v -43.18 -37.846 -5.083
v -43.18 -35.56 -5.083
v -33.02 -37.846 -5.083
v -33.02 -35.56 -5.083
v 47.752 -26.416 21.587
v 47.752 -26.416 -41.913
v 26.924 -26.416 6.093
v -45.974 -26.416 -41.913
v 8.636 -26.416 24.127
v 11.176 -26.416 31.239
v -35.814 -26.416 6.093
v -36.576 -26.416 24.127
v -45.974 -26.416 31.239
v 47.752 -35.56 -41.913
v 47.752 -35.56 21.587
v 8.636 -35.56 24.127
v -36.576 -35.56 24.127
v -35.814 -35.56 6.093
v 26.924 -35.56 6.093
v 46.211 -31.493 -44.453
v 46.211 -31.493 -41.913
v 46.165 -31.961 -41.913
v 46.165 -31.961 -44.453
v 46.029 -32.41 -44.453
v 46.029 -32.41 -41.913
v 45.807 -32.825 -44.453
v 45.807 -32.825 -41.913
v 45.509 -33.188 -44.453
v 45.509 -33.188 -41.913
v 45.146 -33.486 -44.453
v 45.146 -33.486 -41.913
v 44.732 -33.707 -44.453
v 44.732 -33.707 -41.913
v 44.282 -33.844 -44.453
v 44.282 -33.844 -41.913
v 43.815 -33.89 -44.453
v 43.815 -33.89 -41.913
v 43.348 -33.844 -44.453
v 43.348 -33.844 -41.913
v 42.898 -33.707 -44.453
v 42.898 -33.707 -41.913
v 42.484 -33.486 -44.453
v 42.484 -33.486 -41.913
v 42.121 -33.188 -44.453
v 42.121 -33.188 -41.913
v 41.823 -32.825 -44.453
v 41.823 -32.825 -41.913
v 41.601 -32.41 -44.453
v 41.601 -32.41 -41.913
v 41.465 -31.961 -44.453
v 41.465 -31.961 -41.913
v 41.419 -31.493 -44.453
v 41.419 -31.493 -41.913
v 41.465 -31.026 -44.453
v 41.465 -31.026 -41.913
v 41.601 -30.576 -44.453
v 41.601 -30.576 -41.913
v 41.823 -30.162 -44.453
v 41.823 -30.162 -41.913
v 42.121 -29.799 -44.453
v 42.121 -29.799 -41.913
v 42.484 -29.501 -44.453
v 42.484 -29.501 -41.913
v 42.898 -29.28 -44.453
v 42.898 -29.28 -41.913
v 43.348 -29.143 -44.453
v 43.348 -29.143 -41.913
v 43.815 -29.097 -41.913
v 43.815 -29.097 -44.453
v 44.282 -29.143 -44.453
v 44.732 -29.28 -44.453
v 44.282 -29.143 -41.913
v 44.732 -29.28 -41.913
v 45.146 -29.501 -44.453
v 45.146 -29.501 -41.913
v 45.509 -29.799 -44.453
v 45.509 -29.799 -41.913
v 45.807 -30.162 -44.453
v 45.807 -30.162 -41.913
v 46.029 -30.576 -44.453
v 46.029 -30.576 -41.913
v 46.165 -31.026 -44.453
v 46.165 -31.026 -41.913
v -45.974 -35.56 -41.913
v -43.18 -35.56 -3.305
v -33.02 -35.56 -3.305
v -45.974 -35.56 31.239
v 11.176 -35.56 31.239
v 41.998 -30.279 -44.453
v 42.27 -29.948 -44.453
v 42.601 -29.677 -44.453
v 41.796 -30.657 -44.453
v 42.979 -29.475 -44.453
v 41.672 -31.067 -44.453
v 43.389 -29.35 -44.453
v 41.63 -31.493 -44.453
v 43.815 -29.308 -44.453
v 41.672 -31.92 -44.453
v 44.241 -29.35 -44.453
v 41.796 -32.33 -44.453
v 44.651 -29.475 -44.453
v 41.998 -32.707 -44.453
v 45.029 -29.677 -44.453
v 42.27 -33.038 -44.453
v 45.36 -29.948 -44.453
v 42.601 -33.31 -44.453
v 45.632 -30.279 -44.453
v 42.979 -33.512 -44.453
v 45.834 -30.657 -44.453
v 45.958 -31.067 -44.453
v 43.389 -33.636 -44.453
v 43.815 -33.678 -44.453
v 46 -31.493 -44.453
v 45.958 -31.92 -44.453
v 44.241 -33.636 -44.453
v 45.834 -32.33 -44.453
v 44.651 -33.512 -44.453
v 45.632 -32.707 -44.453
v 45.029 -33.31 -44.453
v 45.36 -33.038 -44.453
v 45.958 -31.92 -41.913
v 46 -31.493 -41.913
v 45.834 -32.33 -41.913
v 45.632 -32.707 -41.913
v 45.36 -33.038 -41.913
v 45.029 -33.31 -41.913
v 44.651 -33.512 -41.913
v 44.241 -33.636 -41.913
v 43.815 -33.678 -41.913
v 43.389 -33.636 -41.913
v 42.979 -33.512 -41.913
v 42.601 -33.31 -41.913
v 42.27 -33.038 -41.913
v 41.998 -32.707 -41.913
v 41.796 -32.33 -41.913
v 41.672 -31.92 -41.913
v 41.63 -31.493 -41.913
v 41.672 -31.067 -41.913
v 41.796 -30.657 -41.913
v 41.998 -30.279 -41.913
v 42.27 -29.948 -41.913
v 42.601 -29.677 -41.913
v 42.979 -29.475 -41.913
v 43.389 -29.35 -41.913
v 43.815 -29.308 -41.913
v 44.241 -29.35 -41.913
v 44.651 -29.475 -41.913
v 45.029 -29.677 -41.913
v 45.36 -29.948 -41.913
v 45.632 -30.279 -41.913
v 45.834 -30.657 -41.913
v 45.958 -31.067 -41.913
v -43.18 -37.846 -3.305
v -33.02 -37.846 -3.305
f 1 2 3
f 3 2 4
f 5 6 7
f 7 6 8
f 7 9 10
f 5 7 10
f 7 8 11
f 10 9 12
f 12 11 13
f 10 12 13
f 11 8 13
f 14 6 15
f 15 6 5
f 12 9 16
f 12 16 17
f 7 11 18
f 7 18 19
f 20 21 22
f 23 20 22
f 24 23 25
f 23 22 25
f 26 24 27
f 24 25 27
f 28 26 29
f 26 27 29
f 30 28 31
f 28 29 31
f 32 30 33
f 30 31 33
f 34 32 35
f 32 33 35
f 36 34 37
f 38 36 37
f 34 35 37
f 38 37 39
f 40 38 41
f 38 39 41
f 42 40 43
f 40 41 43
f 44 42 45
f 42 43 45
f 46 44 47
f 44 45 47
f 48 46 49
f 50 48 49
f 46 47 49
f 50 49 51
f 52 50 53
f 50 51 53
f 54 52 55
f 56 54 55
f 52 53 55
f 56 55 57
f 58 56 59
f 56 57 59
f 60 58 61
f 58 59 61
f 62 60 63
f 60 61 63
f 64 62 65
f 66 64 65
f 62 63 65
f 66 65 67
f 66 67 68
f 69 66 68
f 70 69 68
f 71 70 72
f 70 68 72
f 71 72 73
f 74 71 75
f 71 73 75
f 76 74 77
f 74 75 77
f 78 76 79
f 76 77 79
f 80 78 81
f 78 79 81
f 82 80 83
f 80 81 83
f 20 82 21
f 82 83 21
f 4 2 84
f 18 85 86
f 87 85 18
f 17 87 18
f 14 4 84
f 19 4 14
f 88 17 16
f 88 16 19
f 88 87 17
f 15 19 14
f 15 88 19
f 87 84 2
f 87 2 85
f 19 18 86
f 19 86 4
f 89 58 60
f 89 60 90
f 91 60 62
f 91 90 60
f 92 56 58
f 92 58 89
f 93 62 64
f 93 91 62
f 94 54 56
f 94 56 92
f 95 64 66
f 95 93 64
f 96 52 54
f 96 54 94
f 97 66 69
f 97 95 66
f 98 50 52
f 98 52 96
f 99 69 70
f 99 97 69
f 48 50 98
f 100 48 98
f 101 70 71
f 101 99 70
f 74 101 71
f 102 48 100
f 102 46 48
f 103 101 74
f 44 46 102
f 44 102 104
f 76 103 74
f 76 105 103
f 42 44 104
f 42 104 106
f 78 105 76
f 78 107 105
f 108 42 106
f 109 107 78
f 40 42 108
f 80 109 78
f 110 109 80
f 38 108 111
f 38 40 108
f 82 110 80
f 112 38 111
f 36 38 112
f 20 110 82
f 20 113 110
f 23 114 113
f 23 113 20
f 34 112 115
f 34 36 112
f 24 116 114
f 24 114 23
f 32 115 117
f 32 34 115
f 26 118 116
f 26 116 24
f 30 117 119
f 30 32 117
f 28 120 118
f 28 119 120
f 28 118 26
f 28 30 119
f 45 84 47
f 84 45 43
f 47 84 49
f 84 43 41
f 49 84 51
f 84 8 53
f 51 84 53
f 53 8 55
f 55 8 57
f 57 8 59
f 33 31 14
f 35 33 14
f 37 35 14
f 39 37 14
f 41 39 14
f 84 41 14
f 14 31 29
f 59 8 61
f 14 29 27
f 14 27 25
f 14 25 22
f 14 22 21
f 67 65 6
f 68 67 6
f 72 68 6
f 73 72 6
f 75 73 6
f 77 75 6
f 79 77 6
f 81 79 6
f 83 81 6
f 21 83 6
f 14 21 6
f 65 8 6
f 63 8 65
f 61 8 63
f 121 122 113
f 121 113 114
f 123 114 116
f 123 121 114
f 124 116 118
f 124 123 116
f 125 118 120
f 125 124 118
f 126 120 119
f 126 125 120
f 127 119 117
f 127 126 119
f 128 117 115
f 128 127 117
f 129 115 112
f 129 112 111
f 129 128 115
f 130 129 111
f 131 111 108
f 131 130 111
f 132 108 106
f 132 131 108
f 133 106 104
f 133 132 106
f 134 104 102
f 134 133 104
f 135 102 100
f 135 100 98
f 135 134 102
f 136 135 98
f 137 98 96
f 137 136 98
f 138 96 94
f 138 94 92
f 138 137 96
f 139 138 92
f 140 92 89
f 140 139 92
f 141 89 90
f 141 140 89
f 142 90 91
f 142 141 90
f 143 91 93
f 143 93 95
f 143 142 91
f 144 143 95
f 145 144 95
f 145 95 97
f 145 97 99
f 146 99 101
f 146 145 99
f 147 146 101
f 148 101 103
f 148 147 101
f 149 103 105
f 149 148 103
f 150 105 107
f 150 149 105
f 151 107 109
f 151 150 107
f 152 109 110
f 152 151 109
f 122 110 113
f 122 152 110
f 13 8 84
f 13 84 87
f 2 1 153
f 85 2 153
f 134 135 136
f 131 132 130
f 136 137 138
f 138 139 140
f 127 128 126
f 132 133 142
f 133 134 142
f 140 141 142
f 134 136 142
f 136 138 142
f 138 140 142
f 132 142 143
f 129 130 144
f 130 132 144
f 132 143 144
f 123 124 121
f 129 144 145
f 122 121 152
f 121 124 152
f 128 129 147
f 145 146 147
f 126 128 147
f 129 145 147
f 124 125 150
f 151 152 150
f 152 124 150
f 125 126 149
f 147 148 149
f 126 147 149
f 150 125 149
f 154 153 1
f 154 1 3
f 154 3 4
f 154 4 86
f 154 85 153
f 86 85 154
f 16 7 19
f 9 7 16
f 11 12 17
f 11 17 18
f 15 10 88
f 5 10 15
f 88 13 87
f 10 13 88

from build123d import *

# Parameters (mm, degrees)
F0_W      = 93.7260054052
F0_H      = 73.1520000845
F1_DEPTH  = 10.16
F3_DEPTH  = 10.16
F5_DEPTH  = 10.16
F6_DEPTH  = 25.4
F7_W      = 10.1599991322
F7_H      = 1.7780002672
F8_DEPTH  = 2.286
F9_W      = 26.4160018414
F9_H      = 73.1520000845
F10_DEPTH = 127
F12_R     = 2.3962316347
F12_R_2   = 2.1849898249
F13_DEPTH = 2.54


with BuildPart() as f1:
    # F0 (on Front) → F1 (new body)
    with BuildSketch(Plane.XZ):
        with Locations((0.8890014142, -5.3366450593)):
            Rectangle(F0_W, F0_H)
    extrude(amount=F1_DEPTH)

    # F2 (on face) → F3 (cut)
    with BuildSketch(Plane.XZ.offset(10.16)):
        Polygon((47.7520041168, 31.239354983), (11.1760003492, 31.239354983), (47.7520041168, 21.5873550624), align=None)
    extrude(amount=-F3_DEPTH, mode=Mode.SUBTRACT)

    # F4 (on face) → F5 (cut)
    with BuildSketch(Plane.XZ.offset(10.16)):
        Polygon((8.6359996349, 24.1273548454), (-36.5759991109, 24.1273548454), (-35.813998431, 6.0933548957), (26.9239991903, 6.0933548957), align=None)
    extrude(amount=-F5_DEPTH, mode=Mode.SUBTRACT)

    # F6 (add): a face of the model
    f6_faces = [f1.faces().sort_by_distance(p)[0] for p in [
        (1.4948059303, -10.16, -9.7731364868),
    ]]
    extrude(f6_faces, amount=F6_DEPTH)

    # F7 (on face) → F8 (join)
    with BuildSketch(Plane.XZ.offset(35.56)):
        with Locations((-38.1000004709, -4.1936453199)):
            Rectangle(F7_W, F7_H)
    extrude(amount=F8_DEPTH)

    # F9 (on face) → F10 (cut)
    with BuildSketch(Plane(origin=(-45.9740012884, 0, 0), x_dir=(0, -1, 0), z_dir=(-1, 0, 0))):
        with Locations((13.2080009207, -5.3366450593)):
            Rectangle(F9_W, F9_H)
    extrude(amount=-F10_DEPTH, mode=Mode.SUBTRACT)

    # F12 (on face) → F13 (join)
    with BuildSketch(Plane(origin=(0, 0, -41.9126451015), x_dir=(1, 0, 0), z_dir=(0, 0, -1))):
        with Locations((43.8149981201, 31.4933545887)):
            Circle(F12_R)
        with Locations((43.8149981201, 31.4933545887)):
            Circle(F12_R_2, mode=Mode.SUBTRACT)
    extrude(amount=F13_DEPTH)


solid = f1.part
